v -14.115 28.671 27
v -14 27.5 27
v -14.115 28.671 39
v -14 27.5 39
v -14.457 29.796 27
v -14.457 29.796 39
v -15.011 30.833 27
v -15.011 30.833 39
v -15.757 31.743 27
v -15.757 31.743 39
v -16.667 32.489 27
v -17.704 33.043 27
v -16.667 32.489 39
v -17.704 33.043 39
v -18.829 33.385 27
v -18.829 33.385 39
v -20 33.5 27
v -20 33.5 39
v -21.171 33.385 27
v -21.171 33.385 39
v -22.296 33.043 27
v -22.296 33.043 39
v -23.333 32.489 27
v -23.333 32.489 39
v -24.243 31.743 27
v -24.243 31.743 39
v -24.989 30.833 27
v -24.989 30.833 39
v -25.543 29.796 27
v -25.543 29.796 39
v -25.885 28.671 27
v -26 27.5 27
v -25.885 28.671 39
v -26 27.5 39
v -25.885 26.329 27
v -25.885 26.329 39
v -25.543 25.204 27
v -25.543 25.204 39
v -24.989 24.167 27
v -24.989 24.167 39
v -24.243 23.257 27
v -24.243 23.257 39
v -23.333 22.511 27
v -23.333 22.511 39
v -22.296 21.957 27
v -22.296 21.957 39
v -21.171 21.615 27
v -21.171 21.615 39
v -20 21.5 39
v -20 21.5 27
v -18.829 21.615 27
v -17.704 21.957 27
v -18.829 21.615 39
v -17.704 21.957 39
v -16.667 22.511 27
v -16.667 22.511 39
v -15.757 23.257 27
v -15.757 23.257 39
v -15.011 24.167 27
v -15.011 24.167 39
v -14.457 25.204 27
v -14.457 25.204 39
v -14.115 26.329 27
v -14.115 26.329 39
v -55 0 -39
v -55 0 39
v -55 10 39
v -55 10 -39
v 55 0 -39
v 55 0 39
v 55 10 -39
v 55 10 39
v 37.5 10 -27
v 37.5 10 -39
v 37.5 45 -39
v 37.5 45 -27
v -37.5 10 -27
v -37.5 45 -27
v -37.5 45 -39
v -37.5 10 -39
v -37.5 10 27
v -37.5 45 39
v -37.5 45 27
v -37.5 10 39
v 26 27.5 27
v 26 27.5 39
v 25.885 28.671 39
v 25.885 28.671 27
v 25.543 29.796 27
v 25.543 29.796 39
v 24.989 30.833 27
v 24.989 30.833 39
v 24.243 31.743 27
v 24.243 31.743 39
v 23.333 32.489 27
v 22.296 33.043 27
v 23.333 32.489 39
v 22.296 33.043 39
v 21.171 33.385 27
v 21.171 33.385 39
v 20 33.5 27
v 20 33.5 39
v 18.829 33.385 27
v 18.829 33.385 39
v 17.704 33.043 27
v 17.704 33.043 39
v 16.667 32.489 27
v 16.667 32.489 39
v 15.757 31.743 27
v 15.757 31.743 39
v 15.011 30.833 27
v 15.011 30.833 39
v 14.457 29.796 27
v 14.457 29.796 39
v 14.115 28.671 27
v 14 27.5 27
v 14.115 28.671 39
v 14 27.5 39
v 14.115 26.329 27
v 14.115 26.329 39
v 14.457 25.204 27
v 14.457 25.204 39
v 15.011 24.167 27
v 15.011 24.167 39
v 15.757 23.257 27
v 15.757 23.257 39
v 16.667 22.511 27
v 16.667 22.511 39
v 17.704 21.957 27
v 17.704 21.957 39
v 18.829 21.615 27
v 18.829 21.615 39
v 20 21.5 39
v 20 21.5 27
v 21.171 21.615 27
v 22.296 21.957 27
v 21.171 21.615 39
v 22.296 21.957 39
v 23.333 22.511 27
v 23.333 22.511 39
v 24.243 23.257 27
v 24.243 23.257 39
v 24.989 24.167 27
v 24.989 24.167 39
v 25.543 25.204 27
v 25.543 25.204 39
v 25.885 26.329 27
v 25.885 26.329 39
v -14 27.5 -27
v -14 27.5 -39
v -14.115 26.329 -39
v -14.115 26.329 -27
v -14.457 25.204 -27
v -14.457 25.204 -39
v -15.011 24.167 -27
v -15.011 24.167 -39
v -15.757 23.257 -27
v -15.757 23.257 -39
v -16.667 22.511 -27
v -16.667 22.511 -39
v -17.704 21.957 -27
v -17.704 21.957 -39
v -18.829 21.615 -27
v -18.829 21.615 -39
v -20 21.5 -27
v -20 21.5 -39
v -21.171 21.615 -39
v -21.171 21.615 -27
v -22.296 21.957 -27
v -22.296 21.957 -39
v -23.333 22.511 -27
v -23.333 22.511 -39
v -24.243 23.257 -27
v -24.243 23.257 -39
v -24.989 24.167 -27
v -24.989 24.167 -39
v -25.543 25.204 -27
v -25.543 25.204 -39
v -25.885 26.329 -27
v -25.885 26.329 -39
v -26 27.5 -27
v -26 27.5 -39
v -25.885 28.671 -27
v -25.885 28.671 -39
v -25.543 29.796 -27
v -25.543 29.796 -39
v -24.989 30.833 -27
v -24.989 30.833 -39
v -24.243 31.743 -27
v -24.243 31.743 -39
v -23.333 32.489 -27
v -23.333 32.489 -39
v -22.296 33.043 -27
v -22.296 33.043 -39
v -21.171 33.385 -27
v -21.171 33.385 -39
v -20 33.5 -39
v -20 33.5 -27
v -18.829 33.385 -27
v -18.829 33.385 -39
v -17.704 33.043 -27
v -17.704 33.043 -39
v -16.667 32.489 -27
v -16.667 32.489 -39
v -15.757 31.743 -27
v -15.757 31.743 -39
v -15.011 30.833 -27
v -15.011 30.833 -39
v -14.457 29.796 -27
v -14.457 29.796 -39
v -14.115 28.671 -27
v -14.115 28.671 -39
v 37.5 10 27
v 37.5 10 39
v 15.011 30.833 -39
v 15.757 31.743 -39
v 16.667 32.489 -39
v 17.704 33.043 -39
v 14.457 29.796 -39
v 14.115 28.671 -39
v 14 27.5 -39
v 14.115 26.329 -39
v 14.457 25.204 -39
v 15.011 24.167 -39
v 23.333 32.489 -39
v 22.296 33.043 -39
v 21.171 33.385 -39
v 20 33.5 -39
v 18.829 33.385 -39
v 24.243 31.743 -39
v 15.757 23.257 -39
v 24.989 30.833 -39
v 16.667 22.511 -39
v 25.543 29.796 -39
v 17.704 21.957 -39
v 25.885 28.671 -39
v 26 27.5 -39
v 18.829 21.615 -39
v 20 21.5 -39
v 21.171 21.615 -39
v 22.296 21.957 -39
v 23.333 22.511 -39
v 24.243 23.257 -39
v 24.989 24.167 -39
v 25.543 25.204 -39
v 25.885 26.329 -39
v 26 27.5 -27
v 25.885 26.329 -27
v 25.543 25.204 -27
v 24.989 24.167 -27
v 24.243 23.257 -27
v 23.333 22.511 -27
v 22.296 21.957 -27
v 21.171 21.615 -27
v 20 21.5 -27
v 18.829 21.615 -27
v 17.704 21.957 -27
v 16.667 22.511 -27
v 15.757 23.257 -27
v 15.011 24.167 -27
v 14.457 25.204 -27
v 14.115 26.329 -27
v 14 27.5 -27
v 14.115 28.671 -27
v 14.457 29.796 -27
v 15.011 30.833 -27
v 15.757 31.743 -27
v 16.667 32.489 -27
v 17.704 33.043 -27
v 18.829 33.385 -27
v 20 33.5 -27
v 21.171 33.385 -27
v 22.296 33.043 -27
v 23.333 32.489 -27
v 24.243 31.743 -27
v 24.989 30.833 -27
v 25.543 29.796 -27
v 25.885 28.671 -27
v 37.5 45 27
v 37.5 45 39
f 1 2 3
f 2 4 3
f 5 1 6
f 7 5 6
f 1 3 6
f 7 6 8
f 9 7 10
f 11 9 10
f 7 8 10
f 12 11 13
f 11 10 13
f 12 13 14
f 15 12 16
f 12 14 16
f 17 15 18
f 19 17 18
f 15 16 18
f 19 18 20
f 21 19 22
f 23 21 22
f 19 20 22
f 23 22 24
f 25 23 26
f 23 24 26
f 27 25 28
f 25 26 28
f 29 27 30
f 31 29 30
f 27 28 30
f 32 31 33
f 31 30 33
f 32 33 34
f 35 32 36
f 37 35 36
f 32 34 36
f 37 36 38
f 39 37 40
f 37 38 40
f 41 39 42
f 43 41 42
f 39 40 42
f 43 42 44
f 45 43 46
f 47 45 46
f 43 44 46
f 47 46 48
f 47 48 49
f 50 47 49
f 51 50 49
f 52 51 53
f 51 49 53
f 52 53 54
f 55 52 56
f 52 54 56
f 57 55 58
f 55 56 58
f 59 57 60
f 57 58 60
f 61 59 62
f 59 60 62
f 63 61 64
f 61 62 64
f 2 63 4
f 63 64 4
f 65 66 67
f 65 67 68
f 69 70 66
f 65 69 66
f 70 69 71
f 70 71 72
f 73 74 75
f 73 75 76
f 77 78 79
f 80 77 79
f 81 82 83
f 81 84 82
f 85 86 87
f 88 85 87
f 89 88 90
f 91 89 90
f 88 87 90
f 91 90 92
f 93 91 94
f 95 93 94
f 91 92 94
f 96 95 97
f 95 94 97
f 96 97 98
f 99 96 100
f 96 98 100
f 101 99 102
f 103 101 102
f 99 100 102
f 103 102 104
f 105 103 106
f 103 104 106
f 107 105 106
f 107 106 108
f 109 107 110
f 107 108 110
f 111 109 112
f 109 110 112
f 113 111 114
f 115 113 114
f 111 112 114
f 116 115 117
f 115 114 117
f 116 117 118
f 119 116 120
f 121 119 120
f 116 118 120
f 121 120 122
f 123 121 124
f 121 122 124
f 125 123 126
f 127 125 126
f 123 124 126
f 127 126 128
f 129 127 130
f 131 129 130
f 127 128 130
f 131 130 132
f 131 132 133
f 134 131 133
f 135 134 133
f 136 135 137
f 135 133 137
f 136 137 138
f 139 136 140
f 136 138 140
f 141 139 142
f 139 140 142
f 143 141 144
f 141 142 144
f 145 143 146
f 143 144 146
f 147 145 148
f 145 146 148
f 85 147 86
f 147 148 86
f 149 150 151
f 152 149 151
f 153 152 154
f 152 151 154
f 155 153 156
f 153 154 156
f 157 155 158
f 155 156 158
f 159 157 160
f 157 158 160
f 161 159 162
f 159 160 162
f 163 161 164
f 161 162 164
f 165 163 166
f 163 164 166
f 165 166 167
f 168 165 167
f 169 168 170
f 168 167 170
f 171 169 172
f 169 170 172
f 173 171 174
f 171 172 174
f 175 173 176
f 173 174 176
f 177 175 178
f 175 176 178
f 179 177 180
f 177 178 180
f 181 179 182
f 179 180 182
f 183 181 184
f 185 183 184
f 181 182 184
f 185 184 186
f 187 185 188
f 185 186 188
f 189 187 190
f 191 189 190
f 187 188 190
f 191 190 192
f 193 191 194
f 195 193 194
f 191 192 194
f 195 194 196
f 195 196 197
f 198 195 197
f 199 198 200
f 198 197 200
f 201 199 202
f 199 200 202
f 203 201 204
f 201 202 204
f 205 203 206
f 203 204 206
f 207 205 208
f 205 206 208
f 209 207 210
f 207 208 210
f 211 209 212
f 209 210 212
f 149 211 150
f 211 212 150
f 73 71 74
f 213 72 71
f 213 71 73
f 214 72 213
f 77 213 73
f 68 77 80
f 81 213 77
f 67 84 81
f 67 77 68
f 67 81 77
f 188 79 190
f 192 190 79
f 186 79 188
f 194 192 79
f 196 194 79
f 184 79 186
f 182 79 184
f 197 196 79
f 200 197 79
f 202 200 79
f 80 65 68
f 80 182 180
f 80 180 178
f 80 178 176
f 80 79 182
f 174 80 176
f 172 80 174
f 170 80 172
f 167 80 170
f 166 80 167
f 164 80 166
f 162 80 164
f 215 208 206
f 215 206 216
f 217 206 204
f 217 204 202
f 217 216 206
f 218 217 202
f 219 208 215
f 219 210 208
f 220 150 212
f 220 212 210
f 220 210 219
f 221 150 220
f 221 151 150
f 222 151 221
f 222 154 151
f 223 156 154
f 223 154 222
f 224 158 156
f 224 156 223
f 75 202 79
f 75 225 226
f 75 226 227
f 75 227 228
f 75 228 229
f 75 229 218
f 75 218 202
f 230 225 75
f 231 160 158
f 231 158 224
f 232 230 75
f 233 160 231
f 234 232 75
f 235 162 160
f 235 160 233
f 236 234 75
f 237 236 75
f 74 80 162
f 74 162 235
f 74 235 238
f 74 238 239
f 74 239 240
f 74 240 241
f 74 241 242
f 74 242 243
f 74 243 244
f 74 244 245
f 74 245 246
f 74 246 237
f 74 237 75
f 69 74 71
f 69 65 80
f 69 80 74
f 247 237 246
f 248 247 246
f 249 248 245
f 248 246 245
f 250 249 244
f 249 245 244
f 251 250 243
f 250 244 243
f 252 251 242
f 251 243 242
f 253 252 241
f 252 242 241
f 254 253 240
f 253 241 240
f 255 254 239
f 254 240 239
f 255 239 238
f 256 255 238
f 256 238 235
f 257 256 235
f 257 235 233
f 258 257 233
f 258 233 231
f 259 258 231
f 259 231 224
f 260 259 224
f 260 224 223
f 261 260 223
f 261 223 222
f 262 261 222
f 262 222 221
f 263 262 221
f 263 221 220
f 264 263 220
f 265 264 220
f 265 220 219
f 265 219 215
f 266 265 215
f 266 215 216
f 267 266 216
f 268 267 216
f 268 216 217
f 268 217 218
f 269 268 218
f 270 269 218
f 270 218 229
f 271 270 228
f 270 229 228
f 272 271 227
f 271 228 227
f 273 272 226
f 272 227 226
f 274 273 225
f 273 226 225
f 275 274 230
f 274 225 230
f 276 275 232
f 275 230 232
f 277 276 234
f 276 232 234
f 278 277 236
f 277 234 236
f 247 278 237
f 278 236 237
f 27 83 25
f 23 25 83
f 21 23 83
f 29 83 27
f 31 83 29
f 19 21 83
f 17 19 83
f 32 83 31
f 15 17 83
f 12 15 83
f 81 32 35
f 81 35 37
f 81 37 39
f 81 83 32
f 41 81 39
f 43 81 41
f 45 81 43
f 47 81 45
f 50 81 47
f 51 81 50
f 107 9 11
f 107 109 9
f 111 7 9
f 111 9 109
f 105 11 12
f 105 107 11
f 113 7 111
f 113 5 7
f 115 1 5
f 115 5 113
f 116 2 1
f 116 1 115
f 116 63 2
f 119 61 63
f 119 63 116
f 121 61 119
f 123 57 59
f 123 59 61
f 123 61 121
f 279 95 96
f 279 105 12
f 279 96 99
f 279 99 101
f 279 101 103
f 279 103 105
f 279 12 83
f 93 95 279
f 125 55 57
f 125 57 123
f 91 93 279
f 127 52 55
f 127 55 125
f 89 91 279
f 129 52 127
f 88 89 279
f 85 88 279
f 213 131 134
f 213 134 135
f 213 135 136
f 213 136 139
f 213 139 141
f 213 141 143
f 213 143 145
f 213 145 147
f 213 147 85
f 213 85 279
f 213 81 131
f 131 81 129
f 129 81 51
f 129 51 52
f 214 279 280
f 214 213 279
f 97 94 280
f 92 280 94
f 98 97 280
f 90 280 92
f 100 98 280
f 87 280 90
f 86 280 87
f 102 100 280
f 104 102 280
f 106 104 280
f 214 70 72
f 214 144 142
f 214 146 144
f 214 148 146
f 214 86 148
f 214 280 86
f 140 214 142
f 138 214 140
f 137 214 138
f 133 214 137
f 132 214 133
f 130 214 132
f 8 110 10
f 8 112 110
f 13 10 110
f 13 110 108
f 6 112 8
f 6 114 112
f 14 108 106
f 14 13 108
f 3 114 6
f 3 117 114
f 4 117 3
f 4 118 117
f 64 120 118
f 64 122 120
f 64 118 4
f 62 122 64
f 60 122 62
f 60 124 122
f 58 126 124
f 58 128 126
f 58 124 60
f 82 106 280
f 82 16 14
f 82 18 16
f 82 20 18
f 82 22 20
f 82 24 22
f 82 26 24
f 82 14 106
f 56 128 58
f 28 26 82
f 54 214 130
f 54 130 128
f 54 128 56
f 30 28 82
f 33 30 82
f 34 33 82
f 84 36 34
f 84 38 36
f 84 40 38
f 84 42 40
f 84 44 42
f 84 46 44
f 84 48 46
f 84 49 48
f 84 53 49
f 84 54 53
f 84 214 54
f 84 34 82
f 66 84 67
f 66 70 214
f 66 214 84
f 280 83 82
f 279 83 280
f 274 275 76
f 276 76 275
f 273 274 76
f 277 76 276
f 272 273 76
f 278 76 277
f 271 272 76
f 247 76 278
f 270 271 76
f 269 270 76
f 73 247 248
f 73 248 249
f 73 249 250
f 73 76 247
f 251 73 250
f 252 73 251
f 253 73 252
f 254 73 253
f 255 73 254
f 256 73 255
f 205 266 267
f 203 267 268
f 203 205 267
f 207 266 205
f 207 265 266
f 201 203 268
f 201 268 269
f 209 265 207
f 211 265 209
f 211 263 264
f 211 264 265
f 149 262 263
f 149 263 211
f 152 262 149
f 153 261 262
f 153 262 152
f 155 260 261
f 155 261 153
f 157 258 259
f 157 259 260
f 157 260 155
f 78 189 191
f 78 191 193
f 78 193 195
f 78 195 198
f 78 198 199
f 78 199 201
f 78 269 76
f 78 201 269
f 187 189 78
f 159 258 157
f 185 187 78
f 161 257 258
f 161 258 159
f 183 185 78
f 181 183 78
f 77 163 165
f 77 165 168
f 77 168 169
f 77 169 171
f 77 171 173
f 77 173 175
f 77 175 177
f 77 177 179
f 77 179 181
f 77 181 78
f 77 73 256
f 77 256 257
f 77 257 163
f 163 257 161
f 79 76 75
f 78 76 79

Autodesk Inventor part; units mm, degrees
ref_plane "YZ Plane" through (0, 0, 0) normal (1, 0, 0) x (0, 1, 0)
ref_plane "XZ Plane" through (0, 0, 0) normal (0, 1, 0) x (-1, 0, 0)
ref_plane "XY Plane" through (0, 0, 0) normal (0, 0, 1) x (1, 0, 0)
sketch "Sketch1" plane through (0, 0, 0) normal (0, 1, 0) x (-1, 0, 0)
  line L0 (55, 39) -> (55, -39)
  line L1 (55, -39) -> (-55, -39)
  line L2 (-55, -39) -> (-55, 39)
  line L3 (-55, 39) -> (55, 39)
  point P0 (0, 0)
  dimension "d0" = 78
  dimension "d1" = 110
  dimension "d2" = 55
  dimension "d3" = 39
extrude "Extrusion1" add sketch "Sketch1" along normal blind 10
sketch "Sketch2" plane through (0, 10, 0) normal (0, 1, 0) x (1, 0, 0)
  line L0 (-37.5, -39) -> (-37.5, -27)
  line L1 (-37.5, -27) -> (37.5, -27)
  line L2 (37.5, -27) -> (37.5, -39)
  line L3 (37.5, -39) -> (-37.5, -39)
  line L4 (-55, -39) -> (55, -39) projected
  point P0 (0, 0)
  point P1 (-37.5, -33)
  dimension "d6" = 12
  dimension "d8" = 37.5
  dimension "d9" = 75
  dimension "d14" = 33
extrude "Extrusion2" add sketch "Sketch2" along normal blind 35
sketch "Sketch3" plane through (-37.5, 45, 39) normal (0, 0, 1) x (1, 0, 0)
  circle A0 centre (17.5, -17.5) radius 6
  circle A1 centre (57.5, -17.5) radius 6
  line L0 (-17.5, -45) -> (92.5, -45) projected
  line L1 (0, 0) -> (75, 0) projected
  point P0 (37.5, -45)
  point P1 (37.5, 0)
  dimension "d16" = 12
  dimension "d17" = 12
  dimension "d18" = 27.5
  dimension "d19" = 27.5
  dimension "d20" = 40
  dimension "d21" = 20
extrude "Extrusion3" cut sketch "Sketch3" against normal blind 80
mirror "Mirror1" about plane through (0, 0, 0) normal (0, 0, 1) of "Extrusion2", "Extrusion3"
thread "Thread9" size "M12x1.75" class "6H" standard "ANSI Metric M Profile" length 350
thread "Thread13" size "M12x1.75" class "6H" standard "ANSI Metric M Profile" length 600
thread "Thread14" size "M12x1.75" class "6H" standard "ANSI Metric M Profile" length 600
thread "Thread15" size "M12x1.75" class "6H" standard "ANSI Metric M Profile" length 600
properties part number "Base Macaco" material "Steel AISI 4142 380 QT"
